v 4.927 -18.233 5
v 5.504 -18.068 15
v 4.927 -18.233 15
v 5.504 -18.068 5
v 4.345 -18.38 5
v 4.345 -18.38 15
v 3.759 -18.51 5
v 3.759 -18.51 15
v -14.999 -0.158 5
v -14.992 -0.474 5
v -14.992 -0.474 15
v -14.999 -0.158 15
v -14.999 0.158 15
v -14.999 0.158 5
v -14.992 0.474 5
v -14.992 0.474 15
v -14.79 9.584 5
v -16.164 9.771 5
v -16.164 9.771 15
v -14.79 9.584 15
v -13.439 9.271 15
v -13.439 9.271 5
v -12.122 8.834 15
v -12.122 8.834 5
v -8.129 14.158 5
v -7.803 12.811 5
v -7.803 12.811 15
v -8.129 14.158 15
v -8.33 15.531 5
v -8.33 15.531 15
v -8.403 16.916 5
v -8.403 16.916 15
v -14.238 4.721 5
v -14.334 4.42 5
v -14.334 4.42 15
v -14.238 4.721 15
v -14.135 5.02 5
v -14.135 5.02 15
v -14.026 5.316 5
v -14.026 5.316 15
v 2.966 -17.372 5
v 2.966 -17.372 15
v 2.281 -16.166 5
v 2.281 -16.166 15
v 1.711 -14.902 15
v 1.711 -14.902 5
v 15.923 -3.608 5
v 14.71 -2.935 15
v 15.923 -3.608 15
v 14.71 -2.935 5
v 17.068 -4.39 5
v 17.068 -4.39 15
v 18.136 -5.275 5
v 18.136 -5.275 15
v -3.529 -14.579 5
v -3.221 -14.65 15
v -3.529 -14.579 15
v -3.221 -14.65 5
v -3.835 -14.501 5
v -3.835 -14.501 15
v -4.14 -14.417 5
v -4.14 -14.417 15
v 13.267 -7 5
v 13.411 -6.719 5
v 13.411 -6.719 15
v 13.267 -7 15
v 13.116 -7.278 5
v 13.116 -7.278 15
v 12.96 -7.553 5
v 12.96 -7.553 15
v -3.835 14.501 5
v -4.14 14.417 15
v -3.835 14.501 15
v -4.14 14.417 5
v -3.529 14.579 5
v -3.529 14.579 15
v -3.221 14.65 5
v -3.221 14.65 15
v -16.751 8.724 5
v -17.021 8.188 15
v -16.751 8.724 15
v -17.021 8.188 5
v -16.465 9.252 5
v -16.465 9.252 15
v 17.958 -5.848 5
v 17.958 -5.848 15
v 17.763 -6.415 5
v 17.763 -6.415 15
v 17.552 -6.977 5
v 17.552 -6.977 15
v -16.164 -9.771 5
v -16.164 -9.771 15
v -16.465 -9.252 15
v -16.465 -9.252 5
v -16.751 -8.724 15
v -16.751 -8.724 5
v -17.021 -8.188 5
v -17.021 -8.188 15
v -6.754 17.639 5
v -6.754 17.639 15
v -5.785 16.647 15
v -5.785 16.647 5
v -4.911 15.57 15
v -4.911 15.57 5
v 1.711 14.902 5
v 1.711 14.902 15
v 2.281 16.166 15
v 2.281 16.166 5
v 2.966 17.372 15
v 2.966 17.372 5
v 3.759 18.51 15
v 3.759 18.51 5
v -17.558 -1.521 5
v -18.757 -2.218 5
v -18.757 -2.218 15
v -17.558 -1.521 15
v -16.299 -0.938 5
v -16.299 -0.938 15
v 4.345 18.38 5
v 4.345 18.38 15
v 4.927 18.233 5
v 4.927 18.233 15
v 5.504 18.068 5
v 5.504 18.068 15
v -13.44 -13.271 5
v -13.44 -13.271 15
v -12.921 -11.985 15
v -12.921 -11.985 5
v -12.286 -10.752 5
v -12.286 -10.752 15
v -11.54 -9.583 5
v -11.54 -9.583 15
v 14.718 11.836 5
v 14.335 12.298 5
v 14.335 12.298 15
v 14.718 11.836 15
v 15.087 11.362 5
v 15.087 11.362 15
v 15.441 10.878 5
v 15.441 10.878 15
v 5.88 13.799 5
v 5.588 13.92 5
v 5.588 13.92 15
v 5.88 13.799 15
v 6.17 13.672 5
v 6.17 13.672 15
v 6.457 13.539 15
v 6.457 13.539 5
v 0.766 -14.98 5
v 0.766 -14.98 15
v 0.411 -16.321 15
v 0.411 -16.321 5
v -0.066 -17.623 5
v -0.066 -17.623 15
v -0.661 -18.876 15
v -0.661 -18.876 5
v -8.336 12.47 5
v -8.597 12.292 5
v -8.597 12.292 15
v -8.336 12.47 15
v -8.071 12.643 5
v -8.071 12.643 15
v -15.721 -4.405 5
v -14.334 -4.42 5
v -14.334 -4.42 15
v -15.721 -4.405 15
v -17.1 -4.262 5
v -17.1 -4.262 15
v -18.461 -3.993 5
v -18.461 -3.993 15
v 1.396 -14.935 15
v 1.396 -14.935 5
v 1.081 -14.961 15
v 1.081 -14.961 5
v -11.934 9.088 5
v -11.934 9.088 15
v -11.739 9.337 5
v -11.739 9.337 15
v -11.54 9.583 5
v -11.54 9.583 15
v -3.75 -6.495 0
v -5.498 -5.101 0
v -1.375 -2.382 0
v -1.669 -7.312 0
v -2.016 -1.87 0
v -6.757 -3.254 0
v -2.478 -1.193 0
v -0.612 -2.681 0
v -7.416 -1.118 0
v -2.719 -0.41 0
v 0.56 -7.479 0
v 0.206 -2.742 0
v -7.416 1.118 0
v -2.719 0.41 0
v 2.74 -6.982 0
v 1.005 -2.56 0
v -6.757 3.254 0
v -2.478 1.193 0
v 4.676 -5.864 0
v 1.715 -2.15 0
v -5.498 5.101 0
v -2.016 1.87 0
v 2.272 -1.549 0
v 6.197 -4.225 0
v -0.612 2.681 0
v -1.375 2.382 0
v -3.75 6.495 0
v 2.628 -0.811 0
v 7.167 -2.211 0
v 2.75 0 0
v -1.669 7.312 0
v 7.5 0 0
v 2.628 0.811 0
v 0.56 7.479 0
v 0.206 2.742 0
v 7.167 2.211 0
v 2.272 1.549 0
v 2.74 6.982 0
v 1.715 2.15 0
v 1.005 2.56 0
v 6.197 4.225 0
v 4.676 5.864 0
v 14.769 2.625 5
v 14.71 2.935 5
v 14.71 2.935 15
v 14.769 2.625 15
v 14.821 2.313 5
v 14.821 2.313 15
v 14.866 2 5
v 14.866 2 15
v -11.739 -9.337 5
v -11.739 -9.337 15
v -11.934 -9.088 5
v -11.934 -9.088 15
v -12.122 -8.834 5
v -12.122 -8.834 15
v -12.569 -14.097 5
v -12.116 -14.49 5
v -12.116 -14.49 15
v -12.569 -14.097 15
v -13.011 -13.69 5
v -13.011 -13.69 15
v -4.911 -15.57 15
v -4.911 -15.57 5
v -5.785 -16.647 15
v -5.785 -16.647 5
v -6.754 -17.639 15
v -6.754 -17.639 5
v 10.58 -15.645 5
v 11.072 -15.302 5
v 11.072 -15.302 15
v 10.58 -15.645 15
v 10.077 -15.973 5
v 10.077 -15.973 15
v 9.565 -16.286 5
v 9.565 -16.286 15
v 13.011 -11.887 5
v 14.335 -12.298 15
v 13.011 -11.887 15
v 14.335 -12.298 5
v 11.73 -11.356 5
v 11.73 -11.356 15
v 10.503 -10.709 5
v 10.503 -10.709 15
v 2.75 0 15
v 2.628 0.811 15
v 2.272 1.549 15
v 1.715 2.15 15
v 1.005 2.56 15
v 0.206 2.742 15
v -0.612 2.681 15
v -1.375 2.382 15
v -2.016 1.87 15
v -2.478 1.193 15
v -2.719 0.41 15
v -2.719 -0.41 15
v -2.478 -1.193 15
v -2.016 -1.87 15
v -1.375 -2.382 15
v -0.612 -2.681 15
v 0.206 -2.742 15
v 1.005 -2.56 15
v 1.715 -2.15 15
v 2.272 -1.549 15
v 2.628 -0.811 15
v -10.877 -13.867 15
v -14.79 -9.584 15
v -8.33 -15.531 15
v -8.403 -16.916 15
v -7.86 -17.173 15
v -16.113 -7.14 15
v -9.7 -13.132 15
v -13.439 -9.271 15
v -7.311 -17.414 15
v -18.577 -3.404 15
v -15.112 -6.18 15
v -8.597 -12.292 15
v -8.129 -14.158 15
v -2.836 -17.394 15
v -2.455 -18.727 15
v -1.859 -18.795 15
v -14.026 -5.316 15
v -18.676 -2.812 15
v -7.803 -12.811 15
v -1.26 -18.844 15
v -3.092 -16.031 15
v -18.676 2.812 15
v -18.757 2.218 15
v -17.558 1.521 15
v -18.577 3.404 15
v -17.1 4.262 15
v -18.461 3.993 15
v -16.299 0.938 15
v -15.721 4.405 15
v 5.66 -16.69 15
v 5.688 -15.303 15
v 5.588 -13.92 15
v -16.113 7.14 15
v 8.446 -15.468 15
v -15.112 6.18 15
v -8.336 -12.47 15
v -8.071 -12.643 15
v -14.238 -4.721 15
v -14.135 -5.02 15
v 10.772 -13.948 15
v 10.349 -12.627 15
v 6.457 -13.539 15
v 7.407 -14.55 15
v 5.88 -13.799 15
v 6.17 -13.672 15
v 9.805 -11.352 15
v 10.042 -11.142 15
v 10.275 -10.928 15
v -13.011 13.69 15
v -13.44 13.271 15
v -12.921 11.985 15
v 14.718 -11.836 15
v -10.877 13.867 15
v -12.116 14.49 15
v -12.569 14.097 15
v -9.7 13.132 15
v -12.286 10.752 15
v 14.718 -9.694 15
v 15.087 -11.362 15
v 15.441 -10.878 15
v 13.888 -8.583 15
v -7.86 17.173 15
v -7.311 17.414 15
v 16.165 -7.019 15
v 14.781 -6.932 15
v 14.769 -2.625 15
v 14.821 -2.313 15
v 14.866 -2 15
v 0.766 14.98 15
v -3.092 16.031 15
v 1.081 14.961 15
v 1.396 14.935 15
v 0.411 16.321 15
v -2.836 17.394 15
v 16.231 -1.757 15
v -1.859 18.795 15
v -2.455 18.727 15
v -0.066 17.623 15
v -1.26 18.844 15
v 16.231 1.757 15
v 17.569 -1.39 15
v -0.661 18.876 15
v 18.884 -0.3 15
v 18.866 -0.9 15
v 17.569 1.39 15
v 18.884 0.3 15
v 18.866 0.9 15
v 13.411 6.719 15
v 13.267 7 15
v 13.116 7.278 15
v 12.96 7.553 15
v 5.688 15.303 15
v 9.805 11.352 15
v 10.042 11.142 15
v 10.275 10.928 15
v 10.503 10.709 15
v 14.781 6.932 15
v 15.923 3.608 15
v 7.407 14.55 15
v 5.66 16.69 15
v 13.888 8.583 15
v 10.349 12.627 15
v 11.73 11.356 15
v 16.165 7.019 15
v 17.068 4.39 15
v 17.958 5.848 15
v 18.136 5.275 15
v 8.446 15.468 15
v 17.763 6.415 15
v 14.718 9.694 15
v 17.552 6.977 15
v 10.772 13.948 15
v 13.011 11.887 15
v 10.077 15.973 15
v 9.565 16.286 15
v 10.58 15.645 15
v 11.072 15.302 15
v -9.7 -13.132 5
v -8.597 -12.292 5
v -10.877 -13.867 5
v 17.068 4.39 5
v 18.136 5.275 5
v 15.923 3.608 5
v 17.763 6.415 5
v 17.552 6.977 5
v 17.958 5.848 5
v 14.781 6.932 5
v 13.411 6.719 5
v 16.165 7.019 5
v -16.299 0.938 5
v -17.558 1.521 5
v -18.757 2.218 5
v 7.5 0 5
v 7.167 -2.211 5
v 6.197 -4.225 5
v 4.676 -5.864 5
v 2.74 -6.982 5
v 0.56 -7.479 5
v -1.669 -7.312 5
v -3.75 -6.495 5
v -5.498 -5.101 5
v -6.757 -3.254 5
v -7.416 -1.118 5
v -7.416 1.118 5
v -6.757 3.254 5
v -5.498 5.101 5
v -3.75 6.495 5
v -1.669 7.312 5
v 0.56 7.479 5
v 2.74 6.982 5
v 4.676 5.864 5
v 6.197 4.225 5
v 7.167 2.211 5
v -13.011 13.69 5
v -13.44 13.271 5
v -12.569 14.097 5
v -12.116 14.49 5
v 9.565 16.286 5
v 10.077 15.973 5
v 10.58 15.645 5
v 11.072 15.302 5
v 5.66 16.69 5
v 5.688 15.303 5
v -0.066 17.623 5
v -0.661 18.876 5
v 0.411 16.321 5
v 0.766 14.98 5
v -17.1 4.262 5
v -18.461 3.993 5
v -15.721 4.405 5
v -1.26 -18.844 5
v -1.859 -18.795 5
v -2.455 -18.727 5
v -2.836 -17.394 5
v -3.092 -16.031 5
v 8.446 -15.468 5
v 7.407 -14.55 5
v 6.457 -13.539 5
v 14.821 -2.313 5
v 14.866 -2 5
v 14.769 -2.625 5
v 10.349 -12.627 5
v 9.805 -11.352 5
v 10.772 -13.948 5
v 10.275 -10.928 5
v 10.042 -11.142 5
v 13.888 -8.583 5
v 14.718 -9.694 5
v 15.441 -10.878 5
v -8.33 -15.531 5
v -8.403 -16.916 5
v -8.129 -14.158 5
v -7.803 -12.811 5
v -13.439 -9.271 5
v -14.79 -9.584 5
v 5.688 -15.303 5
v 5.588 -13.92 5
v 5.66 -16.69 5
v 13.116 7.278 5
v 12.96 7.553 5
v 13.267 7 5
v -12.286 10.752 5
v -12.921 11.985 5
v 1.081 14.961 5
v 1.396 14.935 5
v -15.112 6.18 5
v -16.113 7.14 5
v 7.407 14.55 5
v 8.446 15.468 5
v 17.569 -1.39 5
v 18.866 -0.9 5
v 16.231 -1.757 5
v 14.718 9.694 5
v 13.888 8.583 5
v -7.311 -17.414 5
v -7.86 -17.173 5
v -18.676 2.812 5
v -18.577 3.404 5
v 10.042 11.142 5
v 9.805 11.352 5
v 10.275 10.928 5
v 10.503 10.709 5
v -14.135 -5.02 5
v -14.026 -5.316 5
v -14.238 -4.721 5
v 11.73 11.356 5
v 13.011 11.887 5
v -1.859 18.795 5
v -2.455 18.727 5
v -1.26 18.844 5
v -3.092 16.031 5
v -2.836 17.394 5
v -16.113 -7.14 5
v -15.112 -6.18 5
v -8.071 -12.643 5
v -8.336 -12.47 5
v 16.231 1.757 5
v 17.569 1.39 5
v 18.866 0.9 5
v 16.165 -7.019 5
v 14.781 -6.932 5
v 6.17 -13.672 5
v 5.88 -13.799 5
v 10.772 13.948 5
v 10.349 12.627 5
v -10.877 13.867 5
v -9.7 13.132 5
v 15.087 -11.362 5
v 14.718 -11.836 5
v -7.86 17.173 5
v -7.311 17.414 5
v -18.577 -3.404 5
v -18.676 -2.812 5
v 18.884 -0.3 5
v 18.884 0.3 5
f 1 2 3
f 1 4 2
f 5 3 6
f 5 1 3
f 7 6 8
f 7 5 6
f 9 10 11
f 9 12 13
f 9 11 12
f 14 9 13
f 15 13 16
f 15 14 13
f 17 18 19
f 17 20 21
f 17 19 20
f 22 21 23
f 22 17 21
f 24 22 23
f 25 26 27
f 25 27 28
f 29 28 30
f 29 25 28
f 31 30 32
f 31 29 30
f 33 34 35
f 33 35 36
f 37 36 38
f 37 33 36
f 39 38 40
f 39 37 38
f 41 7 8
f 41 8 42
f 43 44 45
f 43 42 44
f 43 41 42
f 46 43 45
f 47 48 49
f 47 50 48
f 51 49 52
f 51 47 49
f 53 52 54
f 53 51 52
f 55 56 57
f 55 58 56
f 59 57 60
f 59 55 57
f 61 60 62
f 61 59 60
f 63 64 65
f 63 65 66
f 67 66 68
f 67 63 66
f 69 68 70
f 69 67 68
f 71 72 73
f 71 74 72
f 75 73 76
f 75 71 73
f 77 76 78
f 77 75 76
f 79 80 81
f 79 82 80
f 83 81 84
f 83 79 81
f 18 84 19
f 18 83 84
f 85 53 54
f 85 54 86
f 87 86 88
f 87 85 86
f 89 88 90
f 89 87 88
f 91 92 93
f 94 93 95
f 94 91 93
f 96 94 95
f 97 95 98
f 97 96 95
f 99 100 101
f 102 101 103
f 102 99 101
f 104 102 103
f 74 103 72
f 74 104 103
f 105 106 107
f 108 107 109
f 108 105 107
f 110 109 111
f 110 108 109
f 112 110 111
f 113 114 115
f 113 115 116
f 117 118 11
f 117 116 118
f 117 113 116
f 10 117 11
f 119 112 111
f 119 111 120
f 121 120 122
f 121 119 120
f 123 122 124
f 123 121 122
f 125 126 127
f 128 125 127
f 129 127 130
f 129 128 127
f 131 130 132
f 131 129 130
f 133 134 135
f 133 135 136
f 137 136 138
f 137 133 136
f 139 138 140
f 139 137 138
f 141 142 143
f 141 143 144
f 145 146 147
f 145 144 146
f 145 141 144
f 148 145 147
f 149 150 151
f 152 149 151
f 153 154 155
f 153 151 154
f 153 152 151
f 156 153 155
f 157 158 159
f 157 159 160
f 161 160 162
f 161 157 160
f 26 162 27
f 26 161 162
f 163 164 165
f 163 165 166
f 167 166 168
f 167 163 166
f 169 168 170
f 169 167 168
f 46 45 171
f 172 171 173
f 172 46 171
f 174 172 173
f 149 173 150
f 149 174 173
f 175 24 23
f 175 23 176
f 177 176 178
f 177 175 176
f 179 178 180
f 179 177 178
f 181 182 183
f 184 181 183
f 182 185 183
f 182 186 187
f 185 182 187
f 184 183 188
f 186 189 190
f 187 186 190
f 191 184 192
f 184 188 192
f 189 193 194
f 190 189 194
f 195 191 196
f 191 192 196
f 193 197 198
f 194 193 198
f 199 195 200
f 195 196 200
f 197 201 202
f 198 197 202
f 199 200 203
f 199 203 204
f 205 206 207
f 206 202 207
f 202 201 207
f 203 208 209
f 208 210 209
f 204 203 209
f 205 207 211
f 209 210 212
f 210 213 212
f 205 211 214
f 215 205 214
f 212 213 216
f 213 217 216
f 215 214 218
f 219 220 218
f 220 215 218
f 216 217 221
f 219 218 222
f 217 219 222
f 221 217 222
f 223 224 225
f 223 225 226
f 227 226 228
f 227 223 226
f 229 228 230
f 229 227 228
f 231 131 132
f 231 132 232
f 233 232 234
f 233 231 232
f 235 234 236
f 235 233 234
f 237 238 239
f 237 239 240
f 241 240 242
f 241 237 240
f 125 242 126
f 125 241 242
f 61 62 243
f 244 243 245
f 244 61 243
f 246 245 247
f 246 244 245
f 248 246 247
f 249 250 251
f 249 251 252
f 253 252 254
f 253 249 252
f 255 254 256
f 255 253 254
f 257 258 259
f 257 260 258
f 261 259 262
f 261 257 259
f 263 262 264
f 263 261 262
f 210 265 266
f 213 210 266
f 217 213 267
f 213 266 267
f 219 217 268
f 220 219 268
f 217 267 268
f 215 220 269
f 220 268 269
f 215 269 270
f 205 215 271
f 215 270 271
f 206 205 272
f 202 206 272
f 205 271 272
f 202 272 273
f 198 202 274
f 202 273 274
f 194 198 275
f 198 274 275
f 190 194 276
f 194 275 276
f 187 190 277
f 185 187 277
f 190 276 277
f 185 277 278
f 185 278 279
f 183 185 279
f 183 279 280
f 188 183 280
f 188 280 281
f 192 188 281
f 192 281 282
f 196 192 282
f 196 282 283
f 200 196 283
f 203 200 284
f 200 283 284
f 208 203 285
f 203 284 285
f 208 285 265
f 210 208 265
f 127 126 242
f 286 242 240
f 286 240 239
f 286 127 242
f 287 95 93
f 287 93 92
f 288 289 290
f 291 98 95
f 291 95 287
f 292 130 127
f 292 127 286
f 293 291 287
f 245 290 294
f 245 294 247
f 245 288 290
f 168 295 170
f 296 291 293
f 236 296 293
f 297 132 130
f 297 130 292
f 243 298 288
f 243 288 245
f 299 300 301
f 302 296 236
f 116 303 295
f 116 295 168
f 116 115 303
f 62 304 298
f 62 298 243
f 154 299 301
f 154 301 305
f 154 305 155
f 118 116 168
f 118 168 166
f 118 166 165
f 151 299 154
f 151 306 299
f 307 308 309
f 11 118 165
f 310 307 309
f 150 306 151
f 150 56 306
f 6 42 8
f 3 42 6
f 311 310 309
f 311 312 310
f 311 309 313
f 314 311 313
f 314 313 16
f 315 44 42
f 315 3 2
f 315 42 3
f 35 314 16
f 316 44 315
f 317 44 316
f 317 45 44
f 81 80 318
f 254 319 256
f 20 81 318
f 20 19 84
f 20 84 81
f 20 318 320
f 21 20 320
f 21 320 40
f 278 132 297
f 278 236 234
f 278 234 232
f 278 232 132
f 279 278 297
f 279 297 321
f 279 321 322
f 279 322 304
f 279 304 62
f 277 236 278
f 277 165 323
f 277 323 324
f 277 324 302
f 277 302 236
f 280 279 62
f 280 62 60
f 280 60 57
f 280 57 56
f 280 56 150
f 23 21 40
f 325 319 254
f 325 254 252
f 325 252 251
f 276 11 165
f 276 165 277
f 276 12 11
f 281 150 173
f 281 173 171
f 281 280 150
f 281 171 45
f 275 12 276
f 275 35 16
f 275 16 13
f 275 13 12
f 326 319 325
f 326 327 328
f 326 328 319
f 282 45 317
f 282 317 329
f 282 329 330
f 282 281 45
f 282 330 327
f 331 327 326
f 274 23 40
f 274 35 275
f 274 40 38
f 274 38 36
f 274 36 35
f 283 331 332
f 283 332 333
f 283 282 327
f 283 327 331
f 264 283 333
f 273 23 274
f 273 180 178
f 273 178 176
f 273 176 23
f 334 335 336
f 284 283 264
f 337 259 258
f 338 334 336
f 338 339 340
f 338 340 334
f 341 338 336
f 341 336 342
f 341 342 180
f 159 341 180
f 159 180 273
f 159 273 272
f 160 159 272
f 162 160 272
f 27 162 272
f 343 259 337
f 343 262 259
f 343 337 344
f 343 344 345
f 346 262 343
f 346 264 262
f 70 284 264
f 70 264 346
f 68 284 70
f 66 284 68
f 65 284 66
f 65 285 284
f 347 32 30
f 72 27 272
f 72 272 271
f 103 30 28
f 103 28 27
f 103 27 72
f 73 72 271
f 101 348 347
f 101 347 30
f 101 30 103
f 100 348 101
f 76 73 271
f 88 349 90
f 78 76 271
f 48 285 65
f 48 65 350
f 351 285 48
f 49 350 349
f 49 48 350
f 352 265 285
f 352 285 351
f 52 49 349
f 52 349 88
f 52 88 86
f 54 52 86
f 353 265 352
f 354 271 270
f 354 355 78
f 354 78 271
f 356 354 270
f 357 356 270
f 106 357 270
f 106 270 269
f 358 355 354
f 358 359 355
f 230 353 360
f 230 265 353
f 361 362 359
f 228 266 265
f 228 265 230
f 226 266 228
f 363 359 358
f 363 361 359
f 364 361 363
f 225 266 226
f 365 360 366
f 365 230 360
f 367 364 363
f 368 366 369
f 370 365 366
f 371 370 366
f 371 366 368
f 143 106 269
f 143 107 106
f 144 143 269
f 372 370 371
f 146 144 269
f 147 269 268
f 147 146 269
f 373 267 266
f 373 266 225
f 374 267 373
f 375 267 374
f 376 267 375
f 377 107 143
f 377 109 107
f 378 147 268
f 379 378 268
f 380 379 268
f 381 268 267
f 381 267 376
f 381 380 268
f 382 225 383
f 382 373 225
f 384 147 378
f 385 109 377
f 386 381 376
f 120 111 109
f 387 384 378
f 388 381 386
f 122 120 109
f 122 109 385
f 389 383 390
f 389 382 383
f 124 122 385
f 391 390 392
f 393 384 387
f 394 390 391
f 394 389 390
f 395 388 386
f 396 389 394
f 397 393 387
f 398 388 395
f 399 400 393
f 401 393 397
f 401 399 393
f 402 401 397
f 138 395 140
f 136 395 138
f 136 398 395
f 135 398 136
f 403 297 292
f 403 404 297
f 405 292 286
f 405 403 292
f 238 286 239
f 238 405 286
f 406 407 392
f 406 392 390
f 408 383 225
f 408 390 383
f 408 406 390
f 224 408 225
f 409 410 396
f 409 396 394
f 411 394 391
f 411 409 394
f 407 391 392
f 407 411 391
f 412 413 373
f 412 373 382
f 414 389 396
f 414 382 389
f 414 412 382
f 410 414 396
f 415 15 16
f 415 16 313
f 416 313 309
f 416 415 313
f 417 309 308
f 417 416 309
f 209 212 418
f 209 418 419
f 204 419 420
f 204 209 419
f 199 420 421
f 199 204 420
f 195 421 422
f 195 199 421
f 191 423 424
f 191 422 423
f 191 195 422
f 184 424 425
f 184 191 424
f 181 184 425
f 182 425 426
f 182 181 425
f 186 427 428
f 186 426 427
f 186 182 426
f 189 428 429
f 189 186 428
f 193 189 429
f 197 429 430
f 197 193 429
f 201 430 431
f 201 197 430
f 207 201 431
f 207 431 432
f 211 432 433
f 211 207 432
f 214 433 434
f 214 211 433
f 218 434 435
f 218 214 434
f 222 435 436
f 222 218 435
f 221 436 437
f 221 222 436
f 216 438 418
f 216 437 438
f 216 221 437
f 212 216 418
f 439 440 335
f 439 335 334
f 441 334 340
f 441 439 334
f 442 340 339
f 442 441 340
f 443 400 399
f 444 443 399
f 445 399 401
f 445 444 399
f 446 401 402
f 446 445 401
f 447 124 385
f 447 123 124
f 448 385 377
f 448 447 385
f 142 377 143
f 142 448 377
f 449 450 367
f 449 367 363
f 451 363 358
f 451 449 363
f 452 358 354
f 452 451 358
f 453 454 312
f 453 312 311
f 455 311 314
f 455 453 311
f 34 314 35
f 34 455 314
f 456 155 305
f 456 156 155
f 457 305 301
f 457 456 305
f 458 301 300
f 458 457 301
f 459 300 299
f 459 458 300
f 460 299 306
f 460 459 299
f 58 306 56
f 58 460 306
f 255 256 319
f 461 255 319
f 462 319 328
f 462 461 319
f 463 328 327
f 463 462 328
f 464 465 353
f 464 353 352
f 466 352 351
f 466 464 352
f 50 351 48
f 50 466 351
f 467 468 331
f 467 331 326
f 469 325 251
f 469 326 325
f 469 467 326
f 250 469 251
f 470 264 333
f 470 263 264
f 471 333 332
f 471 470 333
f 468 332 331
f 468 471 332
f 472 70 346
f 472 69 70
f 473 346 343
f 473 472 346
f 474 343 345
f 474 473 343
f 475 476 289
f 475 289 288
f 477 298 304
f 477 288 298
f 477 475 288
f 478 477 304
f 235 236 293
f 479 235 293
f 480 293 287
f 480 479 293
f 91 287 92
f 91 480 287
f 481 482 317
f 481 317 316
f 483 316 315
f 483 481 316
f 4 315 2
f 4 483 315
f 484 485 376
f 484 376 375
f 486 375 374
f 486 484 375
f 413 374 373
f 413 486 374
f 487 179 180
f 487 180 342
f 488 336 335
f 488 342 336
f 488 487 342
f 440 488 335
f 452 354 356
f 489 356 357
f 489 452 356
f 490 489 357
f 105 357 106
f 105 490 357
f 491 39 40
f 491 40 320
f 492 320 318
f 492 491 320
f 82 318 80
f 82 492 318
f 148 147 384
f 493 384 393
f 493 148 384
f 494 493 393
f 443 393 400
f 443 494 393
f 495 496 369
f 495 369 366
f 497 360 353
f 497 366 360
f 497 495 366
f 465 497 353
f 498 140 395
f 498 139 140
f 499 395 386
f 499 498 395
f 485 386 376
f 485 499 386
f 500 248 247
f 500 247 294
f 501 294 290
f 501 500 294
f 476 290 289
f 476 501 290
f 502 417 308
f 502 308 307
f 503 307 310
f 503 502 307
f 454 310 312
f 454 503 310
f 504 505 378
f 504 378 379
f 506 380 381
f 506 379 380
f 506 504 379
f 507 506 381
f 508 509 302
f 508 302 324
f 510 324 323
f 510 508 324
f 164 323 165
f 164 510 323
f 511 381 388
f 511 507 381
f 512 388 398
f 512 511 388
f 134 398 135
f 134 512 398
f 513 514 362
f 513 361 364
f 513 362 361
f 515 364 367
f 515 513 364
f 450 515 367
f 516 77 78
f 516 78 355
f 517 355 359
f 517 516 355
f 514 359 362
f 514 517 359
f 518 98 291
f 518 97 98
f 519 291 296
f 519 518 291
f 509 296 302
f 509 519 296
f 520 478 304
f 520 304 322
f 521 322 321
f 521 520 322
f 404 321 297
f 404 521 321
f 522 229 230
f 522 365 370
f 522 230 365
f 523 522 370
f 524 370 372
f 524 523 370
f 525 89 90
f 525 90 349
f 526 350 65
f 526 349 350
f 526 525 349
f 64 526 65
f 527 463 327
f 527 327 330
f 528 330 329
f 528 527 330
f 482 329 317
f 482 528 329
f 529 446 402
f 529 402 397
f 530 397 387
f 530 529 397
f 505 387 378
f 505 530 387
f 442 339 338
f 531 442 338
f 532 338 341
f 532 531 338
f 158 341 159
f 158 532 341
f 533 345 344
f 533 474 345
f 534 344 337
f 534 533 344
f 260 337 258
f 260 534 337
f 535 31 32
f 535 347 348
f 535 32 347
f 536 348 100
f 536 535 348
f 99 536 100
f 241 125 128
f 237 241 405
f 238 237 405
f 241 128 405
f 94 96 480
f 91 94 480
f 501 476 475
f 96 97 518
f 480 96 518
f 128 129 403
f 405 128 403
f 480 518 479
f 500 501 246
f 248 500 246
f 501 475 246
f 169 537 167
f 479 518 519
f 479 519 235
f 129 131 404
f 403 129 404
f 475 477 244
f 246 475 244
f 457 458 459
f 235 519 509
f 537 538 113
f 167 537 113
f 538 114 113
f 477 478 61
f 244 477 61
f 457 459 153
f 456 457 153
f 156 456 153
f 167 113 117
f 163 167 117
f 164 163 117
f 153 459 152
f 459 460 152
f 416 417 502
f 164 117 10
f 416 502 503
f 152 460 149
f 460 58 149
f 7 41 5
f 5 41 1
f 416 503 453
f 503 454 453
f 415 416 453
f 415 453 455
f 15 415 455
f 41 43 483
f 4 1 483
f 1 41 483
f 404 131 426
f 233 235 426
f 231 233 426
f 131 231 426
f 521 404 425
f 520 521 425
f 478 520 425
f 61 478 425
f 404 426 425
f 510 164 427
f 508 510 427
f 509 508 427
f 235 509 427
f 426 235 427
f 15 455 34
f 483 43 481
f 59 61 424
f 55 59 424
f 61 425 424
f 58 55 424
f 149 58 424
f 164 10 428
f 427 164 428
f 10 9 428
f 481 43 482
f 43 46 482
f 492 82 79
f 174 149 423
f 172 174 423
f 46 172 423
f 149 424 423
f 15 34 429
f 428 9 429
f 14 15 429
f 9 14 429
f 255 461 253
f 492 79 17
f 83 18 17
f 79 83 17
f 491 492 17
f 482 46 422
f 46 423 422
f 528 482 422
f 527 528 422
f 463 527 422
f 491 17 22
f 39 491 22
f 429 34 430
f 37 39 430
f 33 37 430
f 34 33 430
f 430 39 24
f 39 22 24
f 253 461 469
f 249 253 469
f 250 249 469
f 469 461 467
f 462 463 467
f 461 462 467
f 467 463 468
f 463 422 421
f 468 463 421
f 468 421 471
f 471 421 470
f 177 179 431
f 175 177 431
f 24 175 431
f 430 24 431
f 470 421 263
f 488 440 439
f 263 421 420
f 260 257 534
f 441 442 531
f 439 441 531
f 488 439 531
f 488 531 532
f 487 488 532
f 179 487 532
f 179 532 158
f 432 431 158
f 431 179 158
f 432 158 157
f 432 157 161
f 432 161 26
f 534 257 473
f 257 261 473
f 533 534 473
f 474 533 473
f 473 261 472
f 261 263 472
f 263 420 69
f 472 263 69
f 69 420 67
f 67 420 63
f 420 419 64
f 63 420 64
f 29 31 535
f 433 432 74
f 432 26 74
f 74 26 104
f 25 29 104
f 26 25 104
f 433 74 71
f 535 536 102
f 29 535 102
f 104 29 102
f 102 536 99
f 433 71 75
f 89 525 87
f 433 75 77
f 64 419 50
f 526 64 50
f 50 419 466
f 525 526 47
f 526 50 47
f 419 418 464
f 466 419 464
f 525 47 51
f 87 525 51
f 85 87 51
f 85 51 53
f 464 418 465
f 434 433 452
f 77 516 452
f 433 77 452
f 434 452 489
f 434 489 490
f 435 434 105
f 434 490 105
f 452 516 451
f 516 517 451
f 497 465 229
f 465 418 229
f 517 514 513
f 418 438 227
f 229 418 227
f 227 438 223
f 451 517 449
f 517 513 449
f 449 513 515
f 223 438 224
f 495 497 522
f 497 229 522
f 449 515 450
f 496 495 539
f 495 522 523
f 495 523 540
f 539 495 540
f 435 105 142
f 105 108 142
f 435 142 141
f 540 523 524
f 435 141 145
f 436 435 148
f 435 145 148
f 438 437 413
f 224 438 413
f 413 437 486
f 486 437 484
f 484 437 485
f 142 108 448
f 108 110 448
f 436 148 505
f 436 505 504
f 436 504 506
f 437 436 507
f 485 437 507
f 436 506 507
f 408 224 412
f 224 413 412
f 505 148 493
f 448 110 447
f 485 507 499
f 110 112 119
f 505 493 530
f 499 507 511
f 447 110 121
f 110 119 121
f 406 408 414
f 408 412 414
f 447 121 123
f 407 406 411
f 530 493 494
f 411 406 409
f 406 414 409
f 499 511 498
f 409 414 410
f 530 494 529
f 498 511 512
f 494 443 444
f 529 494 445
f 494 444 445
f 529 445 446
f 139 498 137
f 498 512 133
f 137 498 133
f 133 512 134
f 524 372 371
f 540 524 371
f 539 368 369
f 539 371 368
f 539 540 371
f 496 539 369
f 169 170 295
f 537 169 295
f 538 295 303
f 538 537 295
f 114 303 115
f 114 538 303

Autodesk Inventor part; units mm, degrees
ref_plane "YZ Plane" through (0, 0, 0) normal (1, 0, 0) x (0, 1, 0)
ref_plane "XZ Plane" through (0, 0, 0) normal (0, 1, 0) x (-1, 0, 0)
ref_plane "XY Plane" through (0, 0, 0) normal (0, 0, 1) x (1, 0, 0)
sketch "Sketch1" plane through (0, 0, 0) normal (0, 0, 1) x (1, 0, 0)
  circle A0 centre (0, 0) radius 7.5
  circle A1 centre (0, 0) radius 2.75
  dimension "d0" = 15
  dimension "d1" = 5.5
extrude "Extrusion1" add sketch "Sketch1" along normal blind 5
sketch "Sketch2" plane through (0, 0, 5) normal (0, 0, 1) x (1, 0, 0)
  circle A0 centre (0, 0) radius 15
  arc A1 (18.8661, 0.9) -> (14.8661, 2) centre (12.9269, -12.8741) ccw
  arc A2 (18.8661, -0.9) -> (18.8661, 0.9) centre (-1.1137, 0) ccw
  line L0 (0, 0) -> (23.4972, 0) construction
  arc A3 (14.8661, -2) -> (18.8661, -0.9) centre (12.9269, 12.8741) ccw
  arc A4 (14.8661, -2) -> (14.8661, 2) centre (0, 0) ccw
  arc A5 (17.5516, 6.977) -> (13.4112, 6.7186) centre (16.4067, -7.9792) ccw
  arc A6 (18.1361, 5.2746) -> (17.5516, 6.977) centre (-1.0533, -0.3616) ccw
  arc A7 (14.71, 2.9354) -> (18.1361, 5.2746) centre (8.0463, 16.3739) ccw
  arc A8 (14.71, 2.9354) -> (13.4112, 6.7186) centre (0, 0) ccw
  arc A9 (14.3352, 12.298) -> (10.503, 10.7092) centre (18.1086, -2.2196) ccw
  arc A10 (15.4408, 10.8776) -> (14.3352, 12.298) centre (-0.8788, -0.684) ccw
  arc A11 (12.9598, 7.5526) -> (15.4408, 10.8776) centre (2.2937, 18.0994) ccw
  arc A12 (12.9598, 7.5526) -> (10.503, 10.7092) centre (0, 0) ccw
  arc A13 (9.5653, 16.2863) -> (6.4566, 13.5393) centre (17.8482, 3.7805) ccw
  arc A14 (11.0722, 15.3018) -> (9.5653, 16.2863) centre (-0.6091, -0.9323) ccw
  arc A15 (9.8053, 11.3515) -> (11.0722, 15.3018) centre (-3.7074, 17.8635) ccw
  arc A16 (9.8053, 11.3515) -> (6.4566, 13.5393) centre (0, 0) ccw
  arc A17 (3.7589, 18.5097) -> (1.7106, 14.9021) centre (15.6536, 9.371) ccw
  arc A18 (5.5038, 18.0678) -> (3.7589, 18.5097) centre (-0.2734, -1.0796) ccw
  arc A19 (5.5882, 13.9202) -> (5.5038, 18.0678) centre (-9.3068, 15.6918) ccw
  arc A20 (5.5882, 13.9202) -> (1.7106, 14.9021) centre (0, 0) ccw
  arc A21 (-2.4549, 18.7273) -> (-3.2208, 14.6501) centre (11.7627, 13.9459) ccw
  arc A22 (-0.661, 18.876) -> (-2.4549, 18.7273) centre (0.092, -1.1099) ccw
  arc A23 (0.7655, 14.9805) -> (-0.661, 18.876) centre (-13.8977, 11.8196) ccw
  arc A24 (0.7655, 14.9805) -> (-3.2208, 14.6501) centre (0, 0) ccw
  arc A25 (-8.4026, 16.9155) -> (-7.8032, 12.8106) centre (6.5971, 17.0096) ccw
  arc A26 (-6.7542, 17.6386) -> (-8.4026, 16.9155) centre (0.4474, -1.0199) ccw
  arc A27 (-4.1401, 14.4173) -> (-6.7542, 17.6386) centre (-16.9825, 6.6667) ccw
  arc A28 (-4.1401, 14.4173) -> (-7.8032, 12.8106) centre (0, 0) ccw
  arc A29 (-13.4398, 13.2707) -> (-11.54, 9.5828) centre (0.7166, 18.2301) ccw
  arc A30 (-12.1155, 14.4898) -> (-13.4398, 13.2707) centre (0.7543, -0.8194) ccw
  arc A31 (-8.5971, 12.2919) -> (-12.1155, 14.4898) centre (-18.227, 0.7912) ccw
  arc A32 (-8.5971, 12.2919) -> (-11.54, 9.5828) centre (0, 0) ccw
  arc A33 (-17.0206, 8.1877) -> (-14.0262, 5.3165) centre (-5.2415, 17.475) ccw
  arc A34 (-16.1639, 9.7708) -> (-17.0206, 8.1877) centre (0.9794, -0.53) ccw
  arc A35 (-12.1224, 8.8344) -> (-16.1639, 9.7708) centre (-17.4963, -5.1699) ccw
  arc A36 (-12.1224, 8.8344) -> (-14.0262, 5.3165) centre (0, 0) ccw
  arc A37 (-18.7569, 2.2175) -> (-14.9925, 0.4742) centre (-10.6316, 14.8262) ccw
  arc A38 (-18.4606, 3.993) -> (-18.7569, 2.2175) centre (1.0985, -0.1833) ccw
  arc A39 (-14.3341, 4.4196) -> (-18.4606, 3.993) centre (-14.8696, -10.5708) ccw
  arc A40 (-14.3341, 4.4196) -> (-14.9925, 0.4742) centre (0, 0) ccw
  arc A41 (-18.4606, -3.993) -> (-14.3341, -4.4196) centre (-14.8696, 10.5708) ccw
  arc A42 (-18.7569, -2.2175) -> (-18.4606, -3.993) centre (1.0985, 0.1833) ccw
  arc A43 (-14.9925, -0.4742) -> (-18.7569, -2.2175) centre (-10.6316, -14.8262) ccw
  arc A44 (-14.9925, -0.4742) -> (-14.3341, -4.4196) centre (0, 0) ccw
  arc A45 (-16.1639, -9.7708) -> (-12.1224, -8.8344) centre (-17.4963, 5.1699) ccw
  arc A46 (-17.0206, -8.1877) -> (-16.1639, -9.7708) centre (0.9794, 0.53) ccw
  arc A47 (-14.0262, -5.3165) -> (-17.0206, -8.1877) centre (-5.2415, -17.475) ccw
  arc A48 (-14.0262, -5.3165) -> (-12.1224, -8.8344) centre (0, 0) ccw
  arc A49 (-12.1155, -14.4898) -> (-8.5971, -12.2919) centre (-18.227, -0.7912) ccw
  arc A50 (-13.4398, -13.2707) -> (-12.1155, -14.4898) centre (0.7543, 0.8194) ccw
  arc A51 (-11.54, -9.5828) -> (-13.4398, -13.2707) centre (0.7166, -18.2301) ccw
  arc A52 (-11.54, -9.5828) -> (-8.5971, -12.2919) centre (0, 0) ccw
  arc A53 (-6.7542, -17.6386) -> (-4.1401, -14.4173) centre (-16.9825, -6.6667) ccw
  arc A54 (-8.4026, -16.9155) -> (-6.7542, -17.6386) centre (0.4474, 1.0199) ccw
  arc A55 (-7.8032, -12.8106) -> (-8.4026, -16.9155) centre (6.5971, -17.0096) ccw
  arc A56 (-7.8032, -12.8106) -> (-4.1401, -14.4173) centre (0, 0) ccw
  arc A57 (-0.661, -18.876) -> (0.7655, -14.9805) centre (-13.8977, -11.8196) ccw
  arc A58 (-2.4549, -18.7273) -> (-0.661, -18.876) centre (0.092, 1.1099) ccw
  arc A59 (-3.2208, -14.6501) -> (-2.4549, -18.7273) centre (11.7627, -13.9459) ccw
  arc A60 (-3.2208, -14.6501) -> (0.7655, -14.9805) centre (0, 0) ccw
  arc A61 (5.5038, -18.0678) -> (5.5882, -13.9202) centre (-9.3068, -15.6918) ccw
  arc A62 (3.7589, -18.5097) -> (5.5038, -18.0678) centre (-0.2734, 1.0796) ccw
  arc A63 (1.7106, -14.9021) -> (3.7589, -18.5097) centre (15.6536, -9.371) ccw
  arc A64 (1.7106, -14.9021) -> (5.5882, -13.9202) centre (0, 0) ccw
  arc A65 (11.0722, -15.3018) -> (9.8053, -11.3515) centre (-3.7074, -17.8635) ccw
  arc A66 (9.5653, -16.2863) -> (11.0722, -15.3018) centre (-0.6091, 0.9323) ccw
  arc A67 (6.4566, -13.5393) -> (9.5653, -16.2863) centre (17.8482, -3.7805) ccw
  arc A68 (6.4566, -13.5393) -> (9.8053, -11.3515) centre (0, 0) ccw
  arc A69 (15.4408, -10.8776) -> (12.9598, -7.5526) centre (2.2937, -18.0994) ccw
  arc A70 (14.3352, -12.298) -> (15.4408, -10.8776) centre (-0.8788, 0.684) ccw
  arc A71 (10.503, -10.7092) -> (14.3352, -12.298) centre (18.1086, 2.2196) ccw
  arc A72 (10.503, -10.7092) -> (12.9598, -7.5526) centre (0, 0) ccw
  arc A73 (18.1361, -5.2746) -> (14.71, -2.9354) centre (8.0463, -16.3739) ccw
  arc A74 (17.5516, -6.977) -> (18.1361, -5.2746) centre (-1.0533, 0.3616) ccw
  arc A75 (13.4112, -6.7186) -> (17.5516, -6.977) centre (16.4067, 7.9792) ccw
  arc A76 (13.4112, -6.7186) -> (14.71, -2.9354) centre (0, 0) ccw
  circle A77 centre (0, 0) radius 2.75
  point P0 (18.8863, 0)
  point P1 (17.863, 6.1324)
  point P2 (14.904, 11.6002)
  point P3 (10.3298, 15.811)
  point P4 (4.6363, 18.3084)
  point P5 (-1.5596, 18.8218)
  point P6 (-7.5866, 17.2956)
  point P7 (-12.7914, 13.8951)
  point P8 (-16.61, 8.9889)
  point P9 (-18.6287, 3.1086)
  point P10 (-18.6287, -3.1086)
  point P11 (-16.61, -8.9889)
  point P12 (-12.7914, -13.8951)
  point P13 (-7.5866, -17.2956)
  point P14 (-1.5596, -18.8218)
  point P15 (4.6363, -18.3084)
  point P16 (10.3298, -15.811)
  point P17 (14.904, -11.6002)
  point P18 (17.863, -6.1324)
  dimension "d4" = 30
  dimension "d5" = 15
  dimension "d6" = 4
  dimension "d7" = 1.8
  dimension "d8" = 20
  dimension "d10" = 2
  dimension "d11" = 15
  dimension "d12" = 4
  dimension "d13" = 2
  dimension "d16" = 360
extrude "Extrusion2" add sketch "Sketch2" along normal blind 10 contours A0 | A0 A1 A2 A3 | A0 A5 A6 A7 | A73 A74 A75 A0 | A0 A9 A10 A11 | A69 A70 A71 A0 | A0 A13 A14 A15 | A65 A66 A67 A0 | A0 A17 A18 A19 | A61 A62 A63 A0 | A0 A21 A22 A23 | A57 A58 A59 A0 | A0 A25 A26 A27 | A53 A54 A55 A0 | A0 A29 A30 A31 | A49 A50 A51 A0 | A0 A33 A34 A35 | A45 A46 A47 A0 | A0 A37 A38 A39 | A41 A42 A43 A0 | A77
sketch "Sketch3" plane through (0, 0, 15) normal (0, 0, 1) x (1, 0, 0)
  circle A0 centre (0, 0) radius 2.75
  dimension "d22" = 5.5
extrude "Extrusion3" cut sketch "Sketch3" against normal through all
properties part number "BA009" material "ABS Plastic"
